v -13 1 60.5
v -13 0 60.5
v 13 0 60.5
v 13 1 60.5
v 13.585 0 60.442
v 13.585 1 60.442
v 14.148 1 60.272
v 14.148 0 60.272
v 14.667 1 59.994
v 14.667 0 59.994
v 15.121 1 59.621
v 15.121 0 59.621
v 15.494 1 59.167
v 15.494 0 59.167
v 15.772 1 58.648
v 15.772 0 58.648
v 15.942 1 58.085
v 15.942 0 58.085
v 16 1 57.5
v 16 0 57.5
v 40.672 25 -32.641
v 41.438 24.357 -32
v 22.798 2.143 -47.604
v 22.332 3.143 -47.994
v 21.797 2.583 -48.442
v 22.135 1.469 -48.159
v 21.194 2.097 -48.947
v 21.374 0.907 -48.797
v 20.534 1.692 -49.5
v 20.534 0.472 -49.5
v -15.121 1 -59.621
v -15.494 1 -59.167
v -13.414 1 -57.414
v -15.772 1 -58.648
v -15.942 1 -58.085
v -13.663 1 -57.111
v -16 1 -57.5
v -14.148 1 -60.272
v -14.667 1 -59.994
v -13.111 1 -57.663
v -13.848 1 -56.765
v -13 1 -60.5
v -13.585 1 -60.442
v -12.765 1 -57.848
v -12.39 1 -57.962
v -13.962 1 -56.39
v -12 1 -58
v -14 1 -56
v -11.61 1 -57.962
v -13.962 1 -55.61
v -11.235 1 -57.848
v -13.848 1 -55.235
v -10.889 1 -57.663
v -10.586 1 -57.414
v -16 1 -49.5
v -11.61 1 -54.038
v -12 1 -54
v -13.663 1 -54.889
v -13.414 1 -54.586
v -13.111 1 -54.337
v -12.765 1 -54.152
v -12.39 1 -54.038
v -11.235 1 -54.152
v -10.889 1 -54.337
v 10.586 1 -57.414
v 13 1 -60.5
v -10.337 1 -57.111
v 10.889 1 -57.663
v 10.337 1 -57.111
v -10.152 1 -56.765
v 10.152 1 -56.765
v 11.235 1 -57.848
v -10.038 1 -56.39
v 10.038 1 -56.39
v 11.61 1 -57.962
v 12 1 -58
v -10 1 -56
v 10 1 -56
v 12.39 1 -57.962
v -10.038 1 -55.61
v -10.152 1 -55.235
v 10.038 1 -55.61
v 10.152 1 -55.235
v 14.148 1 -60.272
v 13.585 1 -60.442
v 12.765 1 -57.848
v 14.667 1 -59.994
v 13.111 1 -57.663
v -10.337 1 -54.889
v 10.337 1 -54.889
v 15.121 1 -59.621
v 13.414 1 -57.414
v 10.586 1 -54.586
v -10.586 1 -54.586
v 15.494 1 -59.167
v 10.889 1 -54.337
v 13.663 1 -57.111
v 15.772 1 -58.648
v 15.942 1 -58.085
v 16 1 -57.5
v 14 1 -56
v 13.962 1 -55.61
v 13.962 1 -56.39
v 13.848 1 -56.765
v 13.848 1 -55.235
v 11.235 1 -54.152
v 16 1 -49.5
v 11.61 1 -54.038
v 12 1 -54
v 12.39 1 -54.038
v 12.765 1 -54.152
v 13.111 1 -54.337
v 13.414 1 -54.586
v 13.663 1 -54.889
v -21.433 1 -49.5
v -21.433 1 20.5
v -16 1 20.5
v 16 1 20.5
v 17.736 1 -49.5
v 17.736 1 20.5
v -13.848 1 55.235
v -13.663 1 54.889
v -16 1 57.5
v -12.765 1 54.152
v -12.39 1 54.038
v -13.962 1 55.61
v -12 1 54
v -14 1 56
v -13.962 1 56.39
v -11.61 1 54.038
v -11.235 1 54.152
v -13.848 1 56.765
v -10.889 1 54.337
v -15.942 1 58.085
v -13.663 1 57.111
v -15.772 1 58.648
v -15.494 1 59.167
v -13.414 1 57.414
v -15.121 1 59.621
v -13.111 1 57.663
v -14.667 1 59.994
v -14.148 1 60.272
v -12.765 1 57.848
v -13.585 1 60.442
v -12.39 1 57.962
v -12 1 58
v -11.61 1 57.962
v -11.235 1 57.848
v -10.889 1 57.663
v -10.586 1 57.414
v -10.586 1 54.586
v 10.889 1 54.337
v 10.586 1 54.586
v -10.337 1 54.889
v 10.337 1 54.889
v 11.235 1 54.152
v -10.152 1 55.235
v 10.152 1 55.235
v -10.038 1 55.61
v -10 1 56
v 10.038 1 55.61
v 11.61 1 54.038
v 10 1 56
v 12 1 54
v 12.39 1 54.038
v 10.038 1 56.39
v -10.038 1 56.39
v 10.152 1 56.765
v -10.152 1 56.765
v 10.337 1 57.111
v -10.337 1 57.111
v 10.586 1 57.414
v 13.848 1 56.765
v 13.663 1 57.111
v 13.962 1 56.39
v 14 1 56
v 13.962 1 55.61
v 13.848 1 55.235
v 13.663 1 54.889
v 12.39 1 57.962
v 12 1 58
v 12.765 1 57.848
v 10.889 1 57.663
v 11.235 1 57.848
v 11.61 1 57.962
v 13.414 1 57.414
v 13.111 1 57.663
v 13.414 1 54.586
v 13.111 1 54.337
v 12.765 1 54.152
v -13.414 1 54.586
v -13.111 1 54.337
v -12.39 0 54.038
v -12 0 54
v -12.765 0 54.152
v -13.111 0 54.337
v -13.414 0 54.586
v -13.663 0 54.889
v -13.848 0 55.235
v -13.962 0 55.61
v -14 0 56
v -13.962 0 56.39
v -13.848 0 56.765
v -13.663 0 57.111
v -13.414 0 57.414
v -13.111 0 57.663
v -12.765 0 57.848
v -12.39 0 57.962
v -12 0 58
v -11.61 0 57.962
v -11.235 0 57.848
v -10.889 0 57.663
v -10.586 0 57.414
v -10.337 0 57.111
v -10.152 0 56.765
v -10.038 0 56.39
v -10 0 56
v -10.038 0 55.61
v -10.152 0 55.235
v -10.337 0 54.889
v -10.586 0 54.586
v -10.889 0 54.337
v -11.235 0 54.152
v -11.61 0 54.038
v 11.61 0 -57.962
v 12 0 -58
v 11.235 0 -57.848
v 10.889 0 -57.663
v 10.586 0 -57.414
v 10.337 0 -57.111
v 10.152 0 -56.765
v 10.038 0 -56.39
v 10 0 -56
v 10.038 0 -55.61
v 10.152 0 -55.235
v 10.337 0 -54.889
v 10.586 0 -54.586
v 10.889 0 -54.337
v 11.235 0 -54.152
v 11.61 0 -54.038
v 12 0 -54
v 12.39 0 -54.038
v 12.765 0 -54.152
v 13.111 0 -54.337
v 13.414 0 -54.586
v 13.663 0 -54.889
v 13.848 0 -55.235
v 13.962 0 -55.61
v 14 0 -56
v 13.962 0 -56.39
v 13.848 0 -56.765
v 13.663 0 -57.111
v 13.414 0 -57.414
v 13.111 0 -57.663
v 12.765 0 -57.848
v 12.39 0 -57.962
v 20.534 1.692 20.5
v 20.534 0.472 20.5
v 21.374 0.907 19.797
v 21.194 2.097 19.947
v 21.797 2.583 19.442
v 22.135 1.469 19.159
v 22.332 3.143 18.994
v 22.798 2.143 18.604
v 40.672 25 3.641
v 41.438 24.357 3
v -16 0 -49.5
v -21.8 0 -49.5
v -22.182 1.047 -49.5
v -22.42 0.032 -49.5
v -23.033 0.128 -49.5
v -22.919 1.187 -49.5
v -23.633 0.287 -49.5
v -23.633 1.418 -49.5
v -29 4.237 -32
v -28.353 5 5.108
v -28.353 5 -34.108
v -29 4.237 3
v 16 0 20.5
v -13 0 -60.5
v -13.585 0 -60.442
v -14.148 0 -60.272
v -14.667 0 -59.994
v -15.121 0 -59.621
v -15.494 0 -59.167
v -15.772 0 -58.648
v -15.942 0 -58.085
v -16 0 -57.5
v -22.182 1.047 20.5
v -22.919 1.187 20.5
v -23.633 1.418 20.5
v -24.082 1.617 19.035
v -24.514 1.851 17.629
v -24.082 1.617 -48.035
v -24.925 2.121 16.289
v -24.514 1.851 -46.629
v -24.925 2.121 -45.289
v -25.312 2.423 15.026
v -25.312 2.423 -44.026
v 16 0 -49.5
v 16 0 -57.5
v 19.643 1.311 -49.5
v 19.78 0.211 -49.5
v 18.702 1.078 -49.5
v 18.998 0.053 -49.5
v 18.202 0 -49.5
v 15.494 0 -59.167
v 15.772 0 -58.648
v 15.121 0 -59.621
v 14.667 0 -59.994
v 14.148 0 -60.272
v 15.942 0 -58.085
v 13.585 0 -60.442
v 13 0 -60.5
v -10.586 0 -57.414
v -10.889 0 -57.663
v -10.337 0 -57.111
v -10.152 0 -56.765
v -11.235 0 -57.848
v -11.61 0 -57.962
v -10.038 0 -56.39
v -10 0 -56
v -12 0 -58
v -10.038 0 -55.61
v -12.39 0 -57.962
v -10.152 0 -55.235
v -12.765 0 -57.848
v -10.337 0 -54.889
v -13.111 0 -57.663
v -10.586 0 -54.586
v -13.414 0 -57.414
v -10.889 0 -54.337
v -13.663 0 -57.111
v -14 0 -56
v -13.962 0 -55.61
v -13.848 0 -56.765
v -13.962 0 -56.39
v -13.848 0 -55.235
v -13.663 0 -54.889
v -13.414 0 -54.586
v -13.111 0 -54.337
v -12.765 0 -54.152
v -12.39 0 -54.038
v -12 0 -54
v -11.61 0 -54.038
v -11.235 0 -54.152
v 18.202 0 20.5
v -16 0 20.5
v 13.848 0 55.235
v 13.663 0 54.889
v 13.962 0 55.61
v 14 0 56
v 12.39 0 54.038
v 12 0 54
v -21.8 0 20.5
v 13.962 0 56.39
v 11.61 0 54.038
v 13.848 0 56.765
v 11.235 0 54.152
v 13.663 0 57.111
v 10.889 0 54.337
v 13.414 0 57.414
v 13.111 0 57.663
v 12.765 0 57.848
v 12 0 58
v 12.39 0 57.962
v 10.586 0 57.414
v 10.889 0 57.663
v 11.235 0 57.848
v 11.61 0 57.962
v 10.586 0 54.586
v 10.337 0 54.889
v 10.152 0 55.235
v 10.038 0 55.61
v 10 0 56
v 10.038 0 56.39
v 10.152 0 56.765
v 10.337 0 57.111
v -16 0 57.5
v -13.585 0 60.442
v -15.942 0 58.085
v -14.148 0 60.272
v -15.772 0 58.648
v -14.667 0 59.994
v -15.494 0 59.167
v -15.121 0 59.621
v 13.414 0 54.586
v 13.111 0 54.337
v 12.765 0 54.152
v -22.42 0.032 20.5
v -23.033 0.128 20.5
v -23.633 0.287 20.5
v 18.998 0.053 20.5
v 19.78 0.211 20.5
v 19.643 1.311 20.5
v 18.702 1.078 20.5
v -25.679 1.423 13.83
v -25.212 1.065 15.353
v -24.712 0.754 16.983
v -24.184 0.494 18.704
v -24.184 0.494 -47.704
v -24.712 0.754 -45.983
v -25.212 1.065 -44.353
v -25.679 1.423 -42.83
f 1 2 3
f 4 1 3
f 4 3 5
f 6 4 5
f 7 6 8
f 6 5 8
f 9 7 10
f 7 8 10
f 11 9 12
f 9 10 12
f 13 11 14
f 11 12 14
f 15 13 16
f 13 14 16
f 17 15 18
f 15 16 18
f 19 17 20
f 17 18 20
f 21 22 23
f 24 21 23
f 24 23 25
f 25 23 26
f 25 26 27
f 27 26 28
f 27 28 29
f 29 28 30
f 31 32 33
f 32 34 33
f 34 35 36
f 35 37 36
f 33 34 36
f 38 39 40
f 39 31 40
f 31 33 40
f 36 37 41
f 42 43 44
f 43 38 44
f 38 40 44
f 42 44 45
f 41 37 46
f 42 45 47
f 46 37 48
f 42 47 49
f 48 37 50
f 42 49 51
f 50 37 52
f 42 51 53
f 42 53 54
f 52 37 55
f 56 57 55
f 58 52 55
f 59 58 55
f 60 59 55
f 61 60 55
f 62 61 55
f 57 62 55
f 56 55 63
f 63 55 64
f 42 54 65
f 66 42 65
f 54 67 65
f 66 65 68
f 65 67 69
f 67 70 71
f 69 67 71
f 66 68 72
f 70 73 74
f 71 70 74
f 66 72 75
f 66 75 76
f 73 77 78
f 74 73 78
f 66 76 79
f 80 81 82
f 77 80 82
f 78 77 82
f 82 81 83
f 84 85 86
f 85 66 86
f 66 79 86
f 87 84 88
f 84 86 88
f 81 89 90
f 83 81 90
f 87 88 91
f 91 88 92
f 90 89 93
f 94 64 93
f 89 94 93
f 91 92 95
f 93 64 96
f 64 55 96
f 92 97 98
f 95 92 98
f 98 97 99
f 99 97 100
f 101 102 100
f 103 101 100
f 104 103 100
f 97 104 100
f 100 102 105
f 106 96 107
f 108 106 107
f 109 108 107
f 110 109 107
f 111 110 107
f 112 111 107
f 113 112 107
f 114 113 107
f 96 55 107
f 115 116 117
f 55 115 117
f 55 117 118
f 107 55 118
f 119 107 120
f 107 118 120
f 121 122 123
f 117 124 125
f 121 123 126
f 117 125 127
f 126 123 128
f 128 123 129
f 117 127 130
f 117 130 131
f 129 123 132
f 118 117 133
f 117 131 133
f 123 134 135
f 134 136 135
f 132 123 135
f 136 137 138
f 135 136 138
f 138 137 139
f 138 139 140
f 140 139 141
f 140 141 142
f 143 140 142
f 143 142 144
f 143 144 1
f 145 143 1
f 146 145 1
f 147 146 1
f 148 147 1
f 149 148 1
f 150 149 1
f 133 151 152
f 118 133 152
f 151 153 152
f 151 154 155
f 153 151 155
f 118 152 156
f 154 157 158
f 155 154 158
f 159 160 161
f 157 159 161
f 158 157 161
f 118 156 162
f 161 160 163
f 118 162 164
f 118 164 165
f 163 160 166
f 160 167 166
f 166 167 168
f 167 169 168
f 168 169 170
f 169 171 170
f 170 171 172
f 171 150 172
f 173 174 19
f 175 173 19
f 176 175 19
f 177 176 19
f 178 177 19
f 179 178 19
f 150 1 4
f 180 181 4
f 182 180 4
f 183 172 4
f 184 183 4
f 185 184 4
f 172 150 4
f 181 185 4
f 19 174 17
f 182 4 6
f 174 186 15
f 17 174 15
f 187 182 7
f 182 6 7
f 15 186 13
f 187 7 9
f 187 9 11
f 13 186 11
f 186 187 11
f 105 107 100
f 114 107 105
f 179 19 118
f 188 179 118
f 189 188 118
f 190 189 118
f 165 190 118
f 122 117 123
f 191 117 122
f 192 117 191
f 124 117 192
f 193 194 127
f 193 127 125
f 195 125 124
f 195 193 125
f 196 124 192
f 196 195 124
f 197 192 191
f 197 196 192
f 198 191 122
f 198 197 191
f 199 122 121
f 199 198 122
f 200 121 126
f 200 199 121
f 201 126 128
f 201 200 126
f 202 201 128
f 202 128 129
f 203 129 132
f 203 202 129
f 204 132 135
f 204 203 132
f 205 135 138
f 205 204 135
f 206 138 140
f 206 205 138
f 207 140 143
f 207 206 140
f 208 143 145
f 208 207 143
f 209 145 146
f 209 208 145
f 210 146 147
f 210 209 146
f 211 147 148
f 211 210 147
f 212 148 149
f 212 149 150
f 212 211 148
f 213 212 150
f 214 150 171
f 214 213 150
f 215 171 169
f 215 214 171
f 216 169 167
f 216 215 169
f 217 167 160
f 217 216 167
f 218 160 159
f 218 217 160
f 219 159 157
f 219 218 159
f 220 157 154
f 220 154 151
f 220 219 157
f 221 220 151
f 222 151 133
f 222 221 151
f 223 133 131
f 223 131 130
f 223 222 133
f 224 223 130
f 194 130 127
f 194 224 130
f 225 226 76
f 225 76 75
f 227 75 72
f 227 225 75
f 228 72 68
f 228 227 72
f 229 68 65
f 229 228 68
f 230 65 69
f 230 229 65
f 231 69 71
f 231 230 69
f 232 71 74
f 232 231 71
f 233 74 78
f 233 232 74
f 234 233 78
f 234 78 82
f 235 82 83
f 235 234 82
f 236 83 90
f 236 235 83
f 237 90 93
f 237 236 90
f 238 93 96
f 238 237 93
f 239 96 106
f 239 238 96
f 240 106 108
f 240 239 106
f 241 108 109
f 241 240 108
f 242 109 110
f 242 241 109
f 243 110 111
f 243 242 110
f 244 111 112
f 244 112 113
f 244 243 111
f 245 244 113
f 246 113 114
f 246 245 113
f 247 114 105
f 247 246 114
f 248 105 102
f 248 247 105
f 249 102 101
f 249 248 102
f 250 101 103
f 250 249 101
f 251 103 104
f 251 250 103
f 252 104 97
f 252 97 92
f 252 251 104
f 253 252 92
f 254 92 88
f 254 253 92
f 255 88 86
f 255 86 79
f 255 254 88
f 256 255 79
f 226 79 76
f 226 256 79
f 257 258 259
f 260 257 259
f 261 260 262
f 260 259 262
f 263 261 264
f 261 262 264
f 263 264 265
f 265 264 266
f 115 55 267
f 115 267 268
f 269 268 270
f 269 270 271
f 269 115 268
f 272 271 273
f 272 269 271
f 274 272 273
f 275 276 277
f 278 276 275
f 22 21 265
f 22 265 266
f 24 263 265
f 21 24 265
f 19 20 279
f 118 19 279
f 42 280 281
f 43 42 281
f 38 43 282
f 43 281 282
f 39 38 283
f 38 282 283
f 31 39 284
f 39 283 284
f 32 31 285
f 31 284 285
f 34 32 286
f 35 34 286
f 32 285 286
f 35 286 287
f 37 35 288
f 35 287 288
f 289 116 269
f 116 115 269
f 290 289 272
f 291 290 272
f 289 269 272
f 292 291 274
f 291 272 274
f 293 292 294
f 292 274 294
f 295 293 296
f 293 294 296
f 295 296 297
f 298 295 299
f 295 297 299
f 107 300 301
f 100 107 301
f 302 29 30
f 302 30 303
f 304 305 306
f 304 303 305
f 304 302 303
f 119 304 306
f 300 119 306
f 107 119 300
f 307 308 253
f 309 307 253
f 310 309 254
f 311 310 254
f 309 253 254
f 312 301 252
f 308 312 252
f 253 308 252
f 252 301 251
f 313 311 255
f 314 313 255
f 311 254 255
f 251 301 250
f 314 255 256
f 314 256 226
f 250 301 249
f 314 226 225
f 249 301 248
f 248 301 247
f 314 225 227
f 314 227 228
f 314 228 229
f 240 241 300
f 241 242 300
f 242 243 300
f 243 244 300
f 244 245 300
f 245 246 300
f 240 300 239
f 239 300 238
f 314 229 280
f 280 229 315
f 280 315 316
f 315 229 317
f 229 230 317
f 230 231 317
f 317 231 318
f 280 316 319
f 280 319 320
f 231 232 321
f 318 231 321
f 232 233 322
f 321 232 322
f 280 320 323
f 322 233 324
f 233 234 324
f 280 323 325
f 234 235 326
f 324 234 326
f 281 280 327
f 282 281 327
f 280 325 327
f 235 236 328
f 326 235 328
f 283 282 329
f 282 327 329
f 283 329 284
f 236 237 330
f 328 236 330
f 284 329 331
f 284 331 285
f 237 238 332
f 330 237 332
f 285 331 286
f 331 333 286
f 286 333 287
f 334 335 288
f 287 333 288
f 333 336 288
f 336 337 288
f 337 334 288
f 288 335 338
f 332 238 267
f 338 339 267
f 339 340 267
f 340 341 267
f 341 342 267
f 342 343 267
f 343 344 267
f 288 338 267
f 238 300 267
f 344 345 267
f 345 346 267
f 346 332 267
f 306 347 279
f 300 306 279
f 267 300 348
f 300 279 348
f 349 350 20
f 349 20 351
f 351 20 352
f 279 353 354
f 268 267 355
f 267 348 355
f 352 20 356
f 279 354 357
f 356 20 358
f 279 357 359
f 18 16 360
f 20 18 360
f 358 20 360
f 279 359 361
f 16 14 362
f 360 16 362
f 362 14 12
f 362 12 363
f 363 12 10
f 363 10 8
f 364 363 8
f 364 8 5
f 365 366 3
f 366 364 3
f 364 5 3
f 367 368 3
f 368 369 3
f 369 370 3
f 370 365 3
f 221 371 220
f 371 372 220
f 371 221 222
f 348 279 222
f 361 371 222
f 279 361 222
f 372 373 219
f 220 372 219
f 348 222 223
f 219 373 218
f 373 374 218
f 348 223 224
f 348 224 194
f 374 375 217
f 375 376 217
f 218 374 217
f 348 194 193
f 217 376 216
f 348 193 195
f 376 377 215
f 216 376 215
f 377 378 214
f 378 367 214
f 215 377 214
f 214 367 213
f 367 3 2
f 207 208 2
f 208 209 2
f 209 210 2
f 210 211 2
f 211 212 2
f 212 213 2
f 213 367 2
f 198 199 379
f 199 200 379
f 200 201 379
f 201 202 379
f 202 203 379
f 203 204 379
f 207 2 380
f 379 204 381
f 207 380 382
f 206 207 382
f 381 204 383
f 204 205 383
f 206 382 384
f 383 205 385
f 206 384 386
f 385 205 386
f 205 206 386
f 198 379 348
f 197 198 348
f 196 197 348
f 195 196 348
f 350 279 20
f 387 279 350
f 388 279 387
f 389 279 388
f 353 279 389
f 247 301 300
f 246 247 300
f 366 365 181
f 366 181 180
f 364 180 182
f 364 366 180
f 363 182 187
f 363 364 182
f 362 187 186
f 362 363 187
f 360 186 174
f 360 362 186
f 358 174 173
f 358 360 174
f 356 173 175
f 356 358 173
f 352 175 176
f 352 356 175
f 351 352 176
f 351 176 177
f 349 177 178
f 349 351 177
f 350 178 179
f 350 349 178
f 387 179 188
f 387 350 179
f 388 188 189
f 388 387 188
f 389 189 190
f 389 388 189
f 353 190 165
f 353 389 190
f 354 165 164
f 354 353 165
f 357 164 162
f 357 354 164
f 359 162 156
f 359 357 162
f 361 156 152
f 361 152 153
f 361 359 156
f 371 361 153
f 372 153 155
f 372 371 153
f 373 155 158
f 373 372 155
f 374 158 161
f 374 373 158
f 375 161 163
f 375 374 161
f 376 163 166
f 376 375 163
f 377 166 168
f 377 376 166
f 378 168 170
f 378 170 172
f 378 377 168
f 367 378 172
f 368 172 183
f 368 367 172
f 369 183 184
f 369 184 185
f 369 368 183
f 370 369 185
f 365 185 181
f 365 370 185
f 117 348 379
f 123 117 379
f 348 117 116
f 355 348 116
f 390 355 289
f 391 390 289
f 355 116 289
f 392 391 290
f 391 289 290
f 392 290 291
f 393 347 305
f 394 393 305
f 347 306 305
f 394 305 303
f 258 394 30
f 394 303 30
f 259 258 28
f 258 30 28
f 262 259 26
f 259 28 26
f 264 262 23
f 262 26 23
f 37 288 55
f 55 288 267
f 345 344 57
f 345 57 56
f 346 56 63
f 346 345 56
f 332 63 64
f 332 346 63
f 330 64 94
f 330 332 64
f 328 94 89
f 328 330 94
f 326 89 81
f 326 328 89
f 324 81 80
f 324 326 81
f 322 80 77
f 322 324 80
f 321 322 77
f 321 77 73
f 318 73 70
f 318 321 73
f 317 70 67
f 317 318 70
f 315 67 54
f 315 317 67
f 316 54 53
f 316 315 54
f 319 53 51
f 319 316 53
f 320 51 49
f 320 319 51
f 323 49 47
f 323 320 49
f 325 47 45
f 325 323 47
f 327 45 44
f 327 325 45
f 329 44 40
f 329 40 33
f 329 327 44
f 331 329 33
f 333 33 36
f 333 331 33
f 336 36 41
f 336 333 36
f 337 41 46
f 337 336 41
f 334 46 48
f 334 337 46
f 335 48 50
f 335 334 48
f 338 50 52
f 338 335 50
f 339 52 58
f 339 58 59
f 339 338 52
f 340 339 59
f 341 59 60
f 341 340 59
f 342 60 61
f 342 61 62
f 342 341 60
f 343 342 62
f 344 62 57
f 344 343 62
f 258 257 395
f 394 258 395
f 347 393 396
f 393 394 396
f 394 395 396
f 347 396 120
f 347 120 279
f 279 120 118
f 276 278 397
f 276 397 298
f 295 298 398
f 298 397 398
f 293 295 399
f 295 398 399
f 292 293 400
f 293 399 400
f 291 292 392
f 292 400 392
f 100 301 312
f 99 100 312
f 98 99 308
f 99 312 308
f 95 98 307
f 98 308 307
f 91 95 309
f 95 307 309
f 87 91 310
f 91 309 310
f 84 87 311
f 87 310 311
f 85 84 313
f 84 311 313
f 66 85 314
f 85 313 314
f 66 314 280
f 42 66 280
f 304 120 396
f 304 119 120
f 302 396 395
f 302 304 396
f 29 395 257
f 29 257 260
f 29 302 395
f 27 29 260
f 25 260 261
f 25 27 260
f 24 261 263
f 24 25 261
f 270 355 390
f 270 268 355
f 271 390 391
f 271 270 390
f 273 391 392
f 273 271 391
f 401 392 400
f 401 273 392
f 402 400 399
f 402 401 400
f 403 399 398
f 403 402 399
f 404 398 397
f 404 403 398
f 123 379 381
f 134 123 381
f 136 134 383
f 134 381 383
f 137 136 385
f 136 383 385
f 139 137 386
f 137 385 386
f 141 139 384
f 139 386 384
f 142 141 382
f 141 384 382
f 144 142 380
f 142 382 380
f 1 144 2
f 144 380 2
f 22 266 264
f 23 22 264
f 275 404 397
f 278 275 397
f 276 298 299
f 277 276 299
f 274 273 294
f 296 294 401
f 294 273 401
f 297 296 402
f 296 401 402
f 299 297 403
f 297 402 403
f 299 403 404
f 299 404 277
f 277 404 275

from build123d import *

# Parameters (mm, degrees)
SKETCH1_R           = 2
BOSS_EXTRUDE1_DEPTH = 1
BOSS_EXTRUDE2_DEPTH = 70
CUT_EXTRUDE1_DEPTH  = 70
FILLET1_R           = 6
FILLET2_R           = 6


with BuildPart() as part:
    # Sketch1 → Boss-Extrude1 (new body)
    with BuildSketch(Plane(origin=(0, 0, 0), x_dir=(1, 0, 0), z_dir=(0, 1, 0))):
        with BuildLine():
            Line((-12.999999999999979, -60.5), (12.99999999999998, -60.5))
            ThreePointArc((12.99999999999998, -60.5), (15.121320343559649, -59.62132034355964), (16, -57.49999999999997))
            Line((16, -57.49999999999997), (16, 57.49999999999997))
            ThreePointArc((16, 57.49999999999997), (15.121320343559649, 59.62132034355964), (12.99999999999998, 60.5))
            Line((12.99999999999998, 60.5), (-12.999999999999979, 60.5))
            ThreePointArc((-12.999999999999979, 60.5), (-15.121320343559644, 59.62132034355963), (-16, 57.49999999999997))
            Line((-16, 57.49999999999997), (-16, -57.49999999999997))
            ThreePointArc((-16, -57.49999999999997), (-15.121320343559649, -59.62132034355964), (-12.999999999999979, -60.5))
        make_face()
        with Locations(Location((-12, 56, 0), (0, 0, 270))):
            Circle(SKETCH1_R, mode=Mode.SUBTRACT)
        with Locations(Location((12, 56, 0), (0, 0, 90))):
            Circle(SKETCH1_R, mode=Mode.SUBTRACT)
        with Locations(Location((12, -56, 0), (0, 0, 270))):
            Circle(SKETCH1_R, mode=Mode.SUBTRACT)
        with Locations(Location((-12, -56, 0), (0, 0, 90))):
            Circle(SKETCH1_R, mode=Mode.SUBTRACT)
    extrude(amount=BOSS_EXTRUDE1_DEPTH)

    # Sketch2 → Boss-Extrude2 (add)
    with BuildSketch(Plane.XY.offset(20.499999999999996)):
        Polygon((-23.633274615316285, 1), (20.533692341844997, 1), (40.67208349009961, 25.000000000000004), (41.43812793321859, 24.357212390313464), (20.999999999999996, 0), (-24, -9.1e-16), (-28.999999999999993, 4.237089446732834), (-28.353495949190116, 4.9999999999999964), align=None)
    extrude(amount=-BOSS_EXTRUDE2_DEPTH)

    # Sketch3 → Cut-Extrude1 (cut)
    with BuildSketch(Plane.XZ):
        Polygon((20.999999999999996, 20.499999999999996), (20.999999999999996, 20.109633851053125), (40.672083490099595, 3.6412886727309868), (40.67208349009961, 20.499999999999993), align=None)
        Polygon((20.999999999999996, 20.499999999999996), (20.533692341844997, 20.499999999999996), (20.999999999999993, 20.109633851053125), align=None)
        Polygon((40.67208349009961, 20.499999999999993), (40.67208349009961, 3.6412886727309868), (41.43812793321859, 2.9999999999999964), (41.43812793321859, 20.499999999999993), align=None)
        Polygon((41.43812793321859, -32.00000000000001), (40.67208349009961, -32.64128867273098), (40.67208349009961, -49.50000000000001), (41.43812793321859, -49.50000000000001), align=None)
        Polygon((40.67208349009961, -32.64128867273098), (20.999999999999996, -49.10963385105313), (20.999999999999996, -49.5), (40.67208349009961, -49.50000000000001), align=None)
        Polygon((-24, -49.50000000000001), (-23.633274615316285, -49.50000000000001), (-24.00000000000002, -48.30416943816782), align=None)
        Polygon((-24, -49.50000000000001), (-24, -48.30416943816781), (-28.353495949190155, -34.108142317373115), (-28.353495949190116, -49.5), align=None)
        Polygon((-28.353495949190116, -49.5), (-28.353495949190116, -34.10814231737311), (-28.999999999999993, -32.00000000000001), (-28.999999999999993, -49.5), align=None)
        Polygon((-24.00000000000002, 19.304169438167804), (-23.633274615316285, 20.499999999999996), (-24, 20.499999999999996), align=None)
        Polygon((-28.353495949190116, 5.108142317373225), (-24.00000000000002, 19.304169438167804), (-24, 20.499999999999993), (-28.353495949190116, 20.499999999999996), align=None)
        Polygon((-28.999999999999993, 2.9999999999999964), (-28.353495949190116, 5.108142317373225), (-28.353495949190116, 20.499999999999996), (-28.999999999999993, 20.499999999999996), align=None)
        Polygon((20.999999999999996, -49.10963385105313), (20.533692341844997, -49.50000000000001), (20.999999999999996, -49.50000000000001), align=None)
    extrude(amount=-CUT_EXTRUDE1_DEPTH, mode=Mode.SUBTRACT)

    # Fillet1
    fillet1_edges = [part.edges().sort_by_distance(p)[0] for p in [
        (-23.633274615316285, 1, -14.500000000000004),
        (20.533692341844997, 1, -14.500000000000004),
    ]]
    fillet(fillet1_edges, radius=FILLET1_R)

    # Fillet2
    fillet2_edges = [part.edges().sort_by_distance(p)[0] for p in [
        (-24, -9.1e-16, -14.50000000000001),
        (20.999999999999996, 0, -14.500000000000004),
    ]]
    fillet(fillet2_edges, radius=FILLET2_R)


solid = part.part
